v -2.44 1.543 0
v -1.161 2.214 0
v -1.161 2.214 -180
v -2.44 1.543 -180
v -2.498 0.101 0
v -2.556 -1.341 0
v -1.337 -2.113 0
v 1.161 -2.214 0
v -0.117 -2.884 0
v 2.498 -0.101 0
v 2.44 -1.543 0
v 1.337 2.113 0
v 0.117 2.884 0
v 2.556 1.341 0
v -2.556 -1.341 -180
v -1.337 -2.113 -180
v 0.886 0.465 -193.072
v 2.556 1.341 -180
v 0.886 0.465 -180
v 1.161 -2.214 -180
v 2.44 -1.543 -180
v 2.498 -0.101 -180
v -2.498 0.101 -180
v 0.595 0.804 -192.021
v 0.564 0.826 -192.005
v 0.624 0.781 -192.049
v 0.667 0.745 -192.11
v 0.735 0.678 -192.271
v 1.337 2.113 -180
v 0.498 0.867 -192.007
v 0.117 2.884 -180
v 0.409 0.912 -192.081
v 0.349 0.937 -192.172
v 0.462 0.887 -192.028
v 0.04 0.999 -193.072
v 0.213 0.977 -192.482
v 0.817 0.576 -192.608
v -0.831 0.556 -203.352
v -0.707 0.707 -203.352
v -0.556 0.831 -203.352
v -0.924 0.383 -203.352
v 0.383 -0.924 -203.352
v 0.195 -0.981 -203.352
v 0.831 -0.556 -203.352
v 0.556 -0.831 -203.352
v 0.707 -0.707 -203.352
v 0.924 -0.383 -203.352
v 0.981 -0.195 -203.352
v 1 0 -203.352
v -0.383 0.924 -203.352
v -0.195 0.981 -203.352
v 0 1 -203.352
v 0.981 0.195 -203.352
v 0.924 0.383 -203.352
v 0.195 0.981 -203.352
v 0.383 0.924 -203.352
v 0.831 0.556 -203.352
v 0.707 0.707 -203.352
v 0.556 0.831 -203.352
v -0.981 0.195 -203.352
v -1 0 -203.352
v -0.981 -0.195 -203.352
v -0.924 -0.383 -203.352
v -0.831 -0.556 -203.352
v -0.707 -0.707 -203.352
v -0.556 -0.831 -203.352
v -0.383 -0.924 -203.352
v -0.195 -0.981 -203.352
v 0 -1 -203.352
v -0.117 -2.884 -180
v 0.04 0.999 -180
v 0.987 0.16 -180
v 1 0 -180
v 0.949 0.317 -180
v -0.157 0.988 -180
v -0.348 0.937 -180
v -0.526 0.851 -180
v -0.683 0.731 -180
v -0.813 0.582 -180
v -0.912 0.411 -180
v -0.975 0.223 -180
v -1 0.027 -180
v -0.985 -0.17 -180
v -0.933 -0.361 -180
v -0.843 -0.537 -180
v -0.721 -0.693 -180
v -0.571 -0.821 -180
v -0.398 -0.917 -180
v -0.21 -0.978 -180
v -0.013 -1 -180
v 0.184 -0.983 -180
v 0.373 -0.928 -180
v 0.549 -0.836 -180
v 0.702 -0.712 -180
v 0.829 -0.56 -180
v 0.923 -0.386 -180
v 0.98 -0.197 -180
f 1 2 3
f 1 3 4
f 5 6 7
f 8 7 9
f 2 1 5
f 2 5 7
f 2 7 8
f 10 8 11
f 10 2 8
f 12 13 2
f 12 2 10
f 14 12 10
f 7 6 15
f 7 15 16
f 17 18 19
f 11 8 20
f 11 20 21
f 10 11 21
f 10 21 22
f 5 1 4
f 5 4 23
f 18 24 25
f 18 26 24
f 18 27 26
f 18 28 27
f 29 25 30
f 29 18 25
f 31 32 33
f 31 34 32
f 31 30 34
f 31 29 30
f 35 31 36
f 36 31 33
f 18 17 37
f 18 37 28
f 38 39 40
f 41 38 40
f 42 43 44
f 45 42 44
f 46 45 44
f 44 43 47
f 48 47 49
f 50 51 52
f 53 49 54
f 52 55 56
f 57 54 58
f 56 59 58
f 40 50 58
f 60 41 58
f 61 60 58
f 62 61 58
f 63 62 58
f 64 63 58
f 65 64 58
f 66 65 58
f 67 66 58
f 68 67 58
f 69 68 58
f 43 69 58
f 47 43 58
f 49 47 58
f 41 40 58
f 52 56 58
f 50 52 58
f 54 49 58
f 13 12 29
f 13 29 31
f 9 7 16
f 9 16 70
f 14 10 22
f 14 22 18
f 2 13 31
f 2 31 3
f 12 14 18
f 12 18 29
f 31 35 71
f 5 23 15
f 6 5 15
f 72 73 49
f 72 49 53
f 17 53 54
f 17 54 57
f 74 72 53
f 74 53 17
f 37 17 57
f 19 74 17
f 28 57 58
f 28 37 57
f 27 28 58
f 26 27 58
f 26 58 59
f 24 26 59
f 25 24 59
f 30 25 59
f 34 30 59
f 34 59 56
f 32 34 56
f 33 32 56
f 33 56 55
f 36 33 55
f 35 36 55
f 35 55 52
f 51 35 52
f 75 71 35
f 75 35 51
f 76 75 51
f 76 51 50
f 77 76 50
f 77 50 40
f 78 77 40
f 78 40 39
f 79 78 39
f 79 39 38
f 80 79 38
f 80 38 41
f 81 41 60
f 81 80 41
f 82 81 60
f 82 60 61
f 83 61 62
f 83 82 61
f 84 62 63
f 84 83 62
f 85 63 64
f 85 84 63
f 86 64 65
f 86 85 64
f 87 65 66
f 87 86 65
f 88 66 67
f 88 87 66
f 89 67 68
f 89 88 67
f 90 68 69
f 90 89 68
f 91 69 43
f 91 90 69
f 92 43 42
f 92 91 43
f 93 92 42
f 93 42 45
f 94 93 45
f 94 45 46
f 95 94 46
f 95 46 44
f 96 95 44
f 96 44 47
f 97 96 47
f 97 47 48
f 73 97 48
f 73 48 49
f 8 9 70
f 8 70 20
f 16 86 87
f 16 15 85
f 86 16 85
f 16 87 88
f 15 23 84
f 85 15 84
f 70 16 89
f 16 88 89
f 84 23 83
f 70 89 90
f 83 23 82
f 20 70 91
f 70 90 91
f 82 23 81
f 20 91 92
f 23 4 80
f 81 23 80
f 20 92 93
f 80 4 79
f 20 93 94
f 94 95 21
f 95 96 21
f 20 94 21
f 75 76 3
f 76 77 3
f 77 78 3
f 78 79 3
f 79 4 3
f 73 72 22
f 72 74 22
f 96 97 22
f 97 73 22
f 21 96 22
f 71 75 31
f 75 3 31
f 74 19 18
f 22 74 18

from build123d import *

# Parameters (mm, degrees)
F0_R      = 1
F1_DEPTH  = 180
F2_DEPTH  = 203.3524
F1_FACE_W = 2.8867513459
F1_FACE_H = 180


with BuildPart() as f1:
    # F0 (on Top) → F1 (new body)
    with BuildSketch(Plane.XY):
        with BuildLine():
            ThreePointArc((-1.3365232204, -2.1127483715), (-2.213837243, -1.1614321596), (-2.4979553725, 0.1010888571))
            Line((-2.4979553725, 0.1010888571), (-2.5563190236, -1.3411064025))
            Line((-2.5563190236, -1.3411064025), (-1.3365232204, -2.1127483715))
        make_face()
        with BuildLine():
            Line((-0.1167272981, -2.8843904159), (1.1614322324, -2.2138372048))
            ThreePointArc((1.1614322324, -2.2138372048), (-0.1010888301, -2.4979553736), (-1.3365232204, -2.1127483715))
            Line((-1.3365232204, -2.1127483715), (-0.1167272981, -2.8843904159))
        make_face()
        with BuildLine():
            ThreePointArc((-1.1614322324, 2.2138372048), (0.1010888127, 2.4979553743), (1.3365231909, 2.1127483902))
            Line((1.3365231909, 2.1127483902), (0.1167272981, 2.8843904159))
            Line((0.1167272981, 2.8843904159), (-1.1614322324, 2.2138372048))
        make_face()
        with BuildLine():
            ThreePointArc((-2.4979553725, 0.1010888571), (-2.112748401, 1.3365231738), (-1.1614322324, 2.2138372048))
            Line((-1.1614322324, 2.2138372048), (-2.4395917255, 1.5432840134))
            Line((-2.4395917255, 1.5432840134), (-2.4979553725, 0.1010888571))
        make_face()
        with BuildLine():
            Line((2.4395917255, -1.5432840134), (2.4979553754, -0.101088785))
            ThreePointArc((2.4979553754, -0.101088785), (2.1127484203, -1.3365231433), (1.1614322324, -2.2138372048))
            Line((1.1614322324, -2.2138372048), (2.4395917255, -1.5432840134))
        make_face()
        with BuildLine():
            ThreePointArc((1.3365231909, 2.1127483902), (2.1898981685, 1.2059626907), (2.5, 0))
            ThreePointArc((2.5, 0), (2.4994887916, -0.0505547301), (2.4979553754, -0.101088785))
            Line((2.4979553754, -0.101088785), (2.5563190236, 1.3411064025))
            Line((2.5563190236, 1.3411064025), (1.3365231909, 2.1127483902))
        make_face()
        with BuildLine():
            ThreePointArc((2.4979553754, -0.101088785), (2.4994887916, -0.0505547301), (2.5, 0))
            ThreePointArc((2.5, 0), (2.1898981685, 1.2059626907), (1.3365231909, 2.1127483902))
            ThreePointArc((1.3365231909, 2.1127483902), (0.1010888127, 2.4979553743), (-1.1614322324, 2.2138372048))
            ThreePointArc((-1.1614322324, 2.2138372048), (-2.112748401, 1.3365231738), (-2.4979553725, 0.1010888571))
            ThreePointArc((-2.4979553725, 0.1010888571), (-2.213837243, -1.1614321596), (-1.3365232204, -2.1127483715))
            ThreePointArc((-1.3365232204, -2.1127483715), (-0.1010888301, -2.4979553736), (1.1614322324, -2.2138372048))
            ThreePointArc((1.1614322324, -2.2138372048), (2.1127484203, -1.3365231433), (2.4979553754, -0.101088785))
        make_face()
        Circle(F0_R, mode=Mode.SUBTRACT)
    extrude(amount=-F1_DEPTH)

    # F0 (on Top) → F2 (join)
    with BuildSketch(Plane.XY):
        Circle(F0_R)
    extrude(amount=-F2_DEPTH)

    # F1_face (on face) → F5 section 0
    with BuildSketch(Plane(origin=(1.3365231609, 2.1127484092, -90), x_dir=(-0.8450993637, 0.5346092643, 0), z_dir=(0.5346092643, 0.8450993637, 0)), mode=Mode.PRIVATE) as f5_s0:
        Rectangle(F1_FACE_W, F1_FACE_H)
    loft([Vertex(0, 0, -200), f5_s0.sketch])


solid = f1.part
